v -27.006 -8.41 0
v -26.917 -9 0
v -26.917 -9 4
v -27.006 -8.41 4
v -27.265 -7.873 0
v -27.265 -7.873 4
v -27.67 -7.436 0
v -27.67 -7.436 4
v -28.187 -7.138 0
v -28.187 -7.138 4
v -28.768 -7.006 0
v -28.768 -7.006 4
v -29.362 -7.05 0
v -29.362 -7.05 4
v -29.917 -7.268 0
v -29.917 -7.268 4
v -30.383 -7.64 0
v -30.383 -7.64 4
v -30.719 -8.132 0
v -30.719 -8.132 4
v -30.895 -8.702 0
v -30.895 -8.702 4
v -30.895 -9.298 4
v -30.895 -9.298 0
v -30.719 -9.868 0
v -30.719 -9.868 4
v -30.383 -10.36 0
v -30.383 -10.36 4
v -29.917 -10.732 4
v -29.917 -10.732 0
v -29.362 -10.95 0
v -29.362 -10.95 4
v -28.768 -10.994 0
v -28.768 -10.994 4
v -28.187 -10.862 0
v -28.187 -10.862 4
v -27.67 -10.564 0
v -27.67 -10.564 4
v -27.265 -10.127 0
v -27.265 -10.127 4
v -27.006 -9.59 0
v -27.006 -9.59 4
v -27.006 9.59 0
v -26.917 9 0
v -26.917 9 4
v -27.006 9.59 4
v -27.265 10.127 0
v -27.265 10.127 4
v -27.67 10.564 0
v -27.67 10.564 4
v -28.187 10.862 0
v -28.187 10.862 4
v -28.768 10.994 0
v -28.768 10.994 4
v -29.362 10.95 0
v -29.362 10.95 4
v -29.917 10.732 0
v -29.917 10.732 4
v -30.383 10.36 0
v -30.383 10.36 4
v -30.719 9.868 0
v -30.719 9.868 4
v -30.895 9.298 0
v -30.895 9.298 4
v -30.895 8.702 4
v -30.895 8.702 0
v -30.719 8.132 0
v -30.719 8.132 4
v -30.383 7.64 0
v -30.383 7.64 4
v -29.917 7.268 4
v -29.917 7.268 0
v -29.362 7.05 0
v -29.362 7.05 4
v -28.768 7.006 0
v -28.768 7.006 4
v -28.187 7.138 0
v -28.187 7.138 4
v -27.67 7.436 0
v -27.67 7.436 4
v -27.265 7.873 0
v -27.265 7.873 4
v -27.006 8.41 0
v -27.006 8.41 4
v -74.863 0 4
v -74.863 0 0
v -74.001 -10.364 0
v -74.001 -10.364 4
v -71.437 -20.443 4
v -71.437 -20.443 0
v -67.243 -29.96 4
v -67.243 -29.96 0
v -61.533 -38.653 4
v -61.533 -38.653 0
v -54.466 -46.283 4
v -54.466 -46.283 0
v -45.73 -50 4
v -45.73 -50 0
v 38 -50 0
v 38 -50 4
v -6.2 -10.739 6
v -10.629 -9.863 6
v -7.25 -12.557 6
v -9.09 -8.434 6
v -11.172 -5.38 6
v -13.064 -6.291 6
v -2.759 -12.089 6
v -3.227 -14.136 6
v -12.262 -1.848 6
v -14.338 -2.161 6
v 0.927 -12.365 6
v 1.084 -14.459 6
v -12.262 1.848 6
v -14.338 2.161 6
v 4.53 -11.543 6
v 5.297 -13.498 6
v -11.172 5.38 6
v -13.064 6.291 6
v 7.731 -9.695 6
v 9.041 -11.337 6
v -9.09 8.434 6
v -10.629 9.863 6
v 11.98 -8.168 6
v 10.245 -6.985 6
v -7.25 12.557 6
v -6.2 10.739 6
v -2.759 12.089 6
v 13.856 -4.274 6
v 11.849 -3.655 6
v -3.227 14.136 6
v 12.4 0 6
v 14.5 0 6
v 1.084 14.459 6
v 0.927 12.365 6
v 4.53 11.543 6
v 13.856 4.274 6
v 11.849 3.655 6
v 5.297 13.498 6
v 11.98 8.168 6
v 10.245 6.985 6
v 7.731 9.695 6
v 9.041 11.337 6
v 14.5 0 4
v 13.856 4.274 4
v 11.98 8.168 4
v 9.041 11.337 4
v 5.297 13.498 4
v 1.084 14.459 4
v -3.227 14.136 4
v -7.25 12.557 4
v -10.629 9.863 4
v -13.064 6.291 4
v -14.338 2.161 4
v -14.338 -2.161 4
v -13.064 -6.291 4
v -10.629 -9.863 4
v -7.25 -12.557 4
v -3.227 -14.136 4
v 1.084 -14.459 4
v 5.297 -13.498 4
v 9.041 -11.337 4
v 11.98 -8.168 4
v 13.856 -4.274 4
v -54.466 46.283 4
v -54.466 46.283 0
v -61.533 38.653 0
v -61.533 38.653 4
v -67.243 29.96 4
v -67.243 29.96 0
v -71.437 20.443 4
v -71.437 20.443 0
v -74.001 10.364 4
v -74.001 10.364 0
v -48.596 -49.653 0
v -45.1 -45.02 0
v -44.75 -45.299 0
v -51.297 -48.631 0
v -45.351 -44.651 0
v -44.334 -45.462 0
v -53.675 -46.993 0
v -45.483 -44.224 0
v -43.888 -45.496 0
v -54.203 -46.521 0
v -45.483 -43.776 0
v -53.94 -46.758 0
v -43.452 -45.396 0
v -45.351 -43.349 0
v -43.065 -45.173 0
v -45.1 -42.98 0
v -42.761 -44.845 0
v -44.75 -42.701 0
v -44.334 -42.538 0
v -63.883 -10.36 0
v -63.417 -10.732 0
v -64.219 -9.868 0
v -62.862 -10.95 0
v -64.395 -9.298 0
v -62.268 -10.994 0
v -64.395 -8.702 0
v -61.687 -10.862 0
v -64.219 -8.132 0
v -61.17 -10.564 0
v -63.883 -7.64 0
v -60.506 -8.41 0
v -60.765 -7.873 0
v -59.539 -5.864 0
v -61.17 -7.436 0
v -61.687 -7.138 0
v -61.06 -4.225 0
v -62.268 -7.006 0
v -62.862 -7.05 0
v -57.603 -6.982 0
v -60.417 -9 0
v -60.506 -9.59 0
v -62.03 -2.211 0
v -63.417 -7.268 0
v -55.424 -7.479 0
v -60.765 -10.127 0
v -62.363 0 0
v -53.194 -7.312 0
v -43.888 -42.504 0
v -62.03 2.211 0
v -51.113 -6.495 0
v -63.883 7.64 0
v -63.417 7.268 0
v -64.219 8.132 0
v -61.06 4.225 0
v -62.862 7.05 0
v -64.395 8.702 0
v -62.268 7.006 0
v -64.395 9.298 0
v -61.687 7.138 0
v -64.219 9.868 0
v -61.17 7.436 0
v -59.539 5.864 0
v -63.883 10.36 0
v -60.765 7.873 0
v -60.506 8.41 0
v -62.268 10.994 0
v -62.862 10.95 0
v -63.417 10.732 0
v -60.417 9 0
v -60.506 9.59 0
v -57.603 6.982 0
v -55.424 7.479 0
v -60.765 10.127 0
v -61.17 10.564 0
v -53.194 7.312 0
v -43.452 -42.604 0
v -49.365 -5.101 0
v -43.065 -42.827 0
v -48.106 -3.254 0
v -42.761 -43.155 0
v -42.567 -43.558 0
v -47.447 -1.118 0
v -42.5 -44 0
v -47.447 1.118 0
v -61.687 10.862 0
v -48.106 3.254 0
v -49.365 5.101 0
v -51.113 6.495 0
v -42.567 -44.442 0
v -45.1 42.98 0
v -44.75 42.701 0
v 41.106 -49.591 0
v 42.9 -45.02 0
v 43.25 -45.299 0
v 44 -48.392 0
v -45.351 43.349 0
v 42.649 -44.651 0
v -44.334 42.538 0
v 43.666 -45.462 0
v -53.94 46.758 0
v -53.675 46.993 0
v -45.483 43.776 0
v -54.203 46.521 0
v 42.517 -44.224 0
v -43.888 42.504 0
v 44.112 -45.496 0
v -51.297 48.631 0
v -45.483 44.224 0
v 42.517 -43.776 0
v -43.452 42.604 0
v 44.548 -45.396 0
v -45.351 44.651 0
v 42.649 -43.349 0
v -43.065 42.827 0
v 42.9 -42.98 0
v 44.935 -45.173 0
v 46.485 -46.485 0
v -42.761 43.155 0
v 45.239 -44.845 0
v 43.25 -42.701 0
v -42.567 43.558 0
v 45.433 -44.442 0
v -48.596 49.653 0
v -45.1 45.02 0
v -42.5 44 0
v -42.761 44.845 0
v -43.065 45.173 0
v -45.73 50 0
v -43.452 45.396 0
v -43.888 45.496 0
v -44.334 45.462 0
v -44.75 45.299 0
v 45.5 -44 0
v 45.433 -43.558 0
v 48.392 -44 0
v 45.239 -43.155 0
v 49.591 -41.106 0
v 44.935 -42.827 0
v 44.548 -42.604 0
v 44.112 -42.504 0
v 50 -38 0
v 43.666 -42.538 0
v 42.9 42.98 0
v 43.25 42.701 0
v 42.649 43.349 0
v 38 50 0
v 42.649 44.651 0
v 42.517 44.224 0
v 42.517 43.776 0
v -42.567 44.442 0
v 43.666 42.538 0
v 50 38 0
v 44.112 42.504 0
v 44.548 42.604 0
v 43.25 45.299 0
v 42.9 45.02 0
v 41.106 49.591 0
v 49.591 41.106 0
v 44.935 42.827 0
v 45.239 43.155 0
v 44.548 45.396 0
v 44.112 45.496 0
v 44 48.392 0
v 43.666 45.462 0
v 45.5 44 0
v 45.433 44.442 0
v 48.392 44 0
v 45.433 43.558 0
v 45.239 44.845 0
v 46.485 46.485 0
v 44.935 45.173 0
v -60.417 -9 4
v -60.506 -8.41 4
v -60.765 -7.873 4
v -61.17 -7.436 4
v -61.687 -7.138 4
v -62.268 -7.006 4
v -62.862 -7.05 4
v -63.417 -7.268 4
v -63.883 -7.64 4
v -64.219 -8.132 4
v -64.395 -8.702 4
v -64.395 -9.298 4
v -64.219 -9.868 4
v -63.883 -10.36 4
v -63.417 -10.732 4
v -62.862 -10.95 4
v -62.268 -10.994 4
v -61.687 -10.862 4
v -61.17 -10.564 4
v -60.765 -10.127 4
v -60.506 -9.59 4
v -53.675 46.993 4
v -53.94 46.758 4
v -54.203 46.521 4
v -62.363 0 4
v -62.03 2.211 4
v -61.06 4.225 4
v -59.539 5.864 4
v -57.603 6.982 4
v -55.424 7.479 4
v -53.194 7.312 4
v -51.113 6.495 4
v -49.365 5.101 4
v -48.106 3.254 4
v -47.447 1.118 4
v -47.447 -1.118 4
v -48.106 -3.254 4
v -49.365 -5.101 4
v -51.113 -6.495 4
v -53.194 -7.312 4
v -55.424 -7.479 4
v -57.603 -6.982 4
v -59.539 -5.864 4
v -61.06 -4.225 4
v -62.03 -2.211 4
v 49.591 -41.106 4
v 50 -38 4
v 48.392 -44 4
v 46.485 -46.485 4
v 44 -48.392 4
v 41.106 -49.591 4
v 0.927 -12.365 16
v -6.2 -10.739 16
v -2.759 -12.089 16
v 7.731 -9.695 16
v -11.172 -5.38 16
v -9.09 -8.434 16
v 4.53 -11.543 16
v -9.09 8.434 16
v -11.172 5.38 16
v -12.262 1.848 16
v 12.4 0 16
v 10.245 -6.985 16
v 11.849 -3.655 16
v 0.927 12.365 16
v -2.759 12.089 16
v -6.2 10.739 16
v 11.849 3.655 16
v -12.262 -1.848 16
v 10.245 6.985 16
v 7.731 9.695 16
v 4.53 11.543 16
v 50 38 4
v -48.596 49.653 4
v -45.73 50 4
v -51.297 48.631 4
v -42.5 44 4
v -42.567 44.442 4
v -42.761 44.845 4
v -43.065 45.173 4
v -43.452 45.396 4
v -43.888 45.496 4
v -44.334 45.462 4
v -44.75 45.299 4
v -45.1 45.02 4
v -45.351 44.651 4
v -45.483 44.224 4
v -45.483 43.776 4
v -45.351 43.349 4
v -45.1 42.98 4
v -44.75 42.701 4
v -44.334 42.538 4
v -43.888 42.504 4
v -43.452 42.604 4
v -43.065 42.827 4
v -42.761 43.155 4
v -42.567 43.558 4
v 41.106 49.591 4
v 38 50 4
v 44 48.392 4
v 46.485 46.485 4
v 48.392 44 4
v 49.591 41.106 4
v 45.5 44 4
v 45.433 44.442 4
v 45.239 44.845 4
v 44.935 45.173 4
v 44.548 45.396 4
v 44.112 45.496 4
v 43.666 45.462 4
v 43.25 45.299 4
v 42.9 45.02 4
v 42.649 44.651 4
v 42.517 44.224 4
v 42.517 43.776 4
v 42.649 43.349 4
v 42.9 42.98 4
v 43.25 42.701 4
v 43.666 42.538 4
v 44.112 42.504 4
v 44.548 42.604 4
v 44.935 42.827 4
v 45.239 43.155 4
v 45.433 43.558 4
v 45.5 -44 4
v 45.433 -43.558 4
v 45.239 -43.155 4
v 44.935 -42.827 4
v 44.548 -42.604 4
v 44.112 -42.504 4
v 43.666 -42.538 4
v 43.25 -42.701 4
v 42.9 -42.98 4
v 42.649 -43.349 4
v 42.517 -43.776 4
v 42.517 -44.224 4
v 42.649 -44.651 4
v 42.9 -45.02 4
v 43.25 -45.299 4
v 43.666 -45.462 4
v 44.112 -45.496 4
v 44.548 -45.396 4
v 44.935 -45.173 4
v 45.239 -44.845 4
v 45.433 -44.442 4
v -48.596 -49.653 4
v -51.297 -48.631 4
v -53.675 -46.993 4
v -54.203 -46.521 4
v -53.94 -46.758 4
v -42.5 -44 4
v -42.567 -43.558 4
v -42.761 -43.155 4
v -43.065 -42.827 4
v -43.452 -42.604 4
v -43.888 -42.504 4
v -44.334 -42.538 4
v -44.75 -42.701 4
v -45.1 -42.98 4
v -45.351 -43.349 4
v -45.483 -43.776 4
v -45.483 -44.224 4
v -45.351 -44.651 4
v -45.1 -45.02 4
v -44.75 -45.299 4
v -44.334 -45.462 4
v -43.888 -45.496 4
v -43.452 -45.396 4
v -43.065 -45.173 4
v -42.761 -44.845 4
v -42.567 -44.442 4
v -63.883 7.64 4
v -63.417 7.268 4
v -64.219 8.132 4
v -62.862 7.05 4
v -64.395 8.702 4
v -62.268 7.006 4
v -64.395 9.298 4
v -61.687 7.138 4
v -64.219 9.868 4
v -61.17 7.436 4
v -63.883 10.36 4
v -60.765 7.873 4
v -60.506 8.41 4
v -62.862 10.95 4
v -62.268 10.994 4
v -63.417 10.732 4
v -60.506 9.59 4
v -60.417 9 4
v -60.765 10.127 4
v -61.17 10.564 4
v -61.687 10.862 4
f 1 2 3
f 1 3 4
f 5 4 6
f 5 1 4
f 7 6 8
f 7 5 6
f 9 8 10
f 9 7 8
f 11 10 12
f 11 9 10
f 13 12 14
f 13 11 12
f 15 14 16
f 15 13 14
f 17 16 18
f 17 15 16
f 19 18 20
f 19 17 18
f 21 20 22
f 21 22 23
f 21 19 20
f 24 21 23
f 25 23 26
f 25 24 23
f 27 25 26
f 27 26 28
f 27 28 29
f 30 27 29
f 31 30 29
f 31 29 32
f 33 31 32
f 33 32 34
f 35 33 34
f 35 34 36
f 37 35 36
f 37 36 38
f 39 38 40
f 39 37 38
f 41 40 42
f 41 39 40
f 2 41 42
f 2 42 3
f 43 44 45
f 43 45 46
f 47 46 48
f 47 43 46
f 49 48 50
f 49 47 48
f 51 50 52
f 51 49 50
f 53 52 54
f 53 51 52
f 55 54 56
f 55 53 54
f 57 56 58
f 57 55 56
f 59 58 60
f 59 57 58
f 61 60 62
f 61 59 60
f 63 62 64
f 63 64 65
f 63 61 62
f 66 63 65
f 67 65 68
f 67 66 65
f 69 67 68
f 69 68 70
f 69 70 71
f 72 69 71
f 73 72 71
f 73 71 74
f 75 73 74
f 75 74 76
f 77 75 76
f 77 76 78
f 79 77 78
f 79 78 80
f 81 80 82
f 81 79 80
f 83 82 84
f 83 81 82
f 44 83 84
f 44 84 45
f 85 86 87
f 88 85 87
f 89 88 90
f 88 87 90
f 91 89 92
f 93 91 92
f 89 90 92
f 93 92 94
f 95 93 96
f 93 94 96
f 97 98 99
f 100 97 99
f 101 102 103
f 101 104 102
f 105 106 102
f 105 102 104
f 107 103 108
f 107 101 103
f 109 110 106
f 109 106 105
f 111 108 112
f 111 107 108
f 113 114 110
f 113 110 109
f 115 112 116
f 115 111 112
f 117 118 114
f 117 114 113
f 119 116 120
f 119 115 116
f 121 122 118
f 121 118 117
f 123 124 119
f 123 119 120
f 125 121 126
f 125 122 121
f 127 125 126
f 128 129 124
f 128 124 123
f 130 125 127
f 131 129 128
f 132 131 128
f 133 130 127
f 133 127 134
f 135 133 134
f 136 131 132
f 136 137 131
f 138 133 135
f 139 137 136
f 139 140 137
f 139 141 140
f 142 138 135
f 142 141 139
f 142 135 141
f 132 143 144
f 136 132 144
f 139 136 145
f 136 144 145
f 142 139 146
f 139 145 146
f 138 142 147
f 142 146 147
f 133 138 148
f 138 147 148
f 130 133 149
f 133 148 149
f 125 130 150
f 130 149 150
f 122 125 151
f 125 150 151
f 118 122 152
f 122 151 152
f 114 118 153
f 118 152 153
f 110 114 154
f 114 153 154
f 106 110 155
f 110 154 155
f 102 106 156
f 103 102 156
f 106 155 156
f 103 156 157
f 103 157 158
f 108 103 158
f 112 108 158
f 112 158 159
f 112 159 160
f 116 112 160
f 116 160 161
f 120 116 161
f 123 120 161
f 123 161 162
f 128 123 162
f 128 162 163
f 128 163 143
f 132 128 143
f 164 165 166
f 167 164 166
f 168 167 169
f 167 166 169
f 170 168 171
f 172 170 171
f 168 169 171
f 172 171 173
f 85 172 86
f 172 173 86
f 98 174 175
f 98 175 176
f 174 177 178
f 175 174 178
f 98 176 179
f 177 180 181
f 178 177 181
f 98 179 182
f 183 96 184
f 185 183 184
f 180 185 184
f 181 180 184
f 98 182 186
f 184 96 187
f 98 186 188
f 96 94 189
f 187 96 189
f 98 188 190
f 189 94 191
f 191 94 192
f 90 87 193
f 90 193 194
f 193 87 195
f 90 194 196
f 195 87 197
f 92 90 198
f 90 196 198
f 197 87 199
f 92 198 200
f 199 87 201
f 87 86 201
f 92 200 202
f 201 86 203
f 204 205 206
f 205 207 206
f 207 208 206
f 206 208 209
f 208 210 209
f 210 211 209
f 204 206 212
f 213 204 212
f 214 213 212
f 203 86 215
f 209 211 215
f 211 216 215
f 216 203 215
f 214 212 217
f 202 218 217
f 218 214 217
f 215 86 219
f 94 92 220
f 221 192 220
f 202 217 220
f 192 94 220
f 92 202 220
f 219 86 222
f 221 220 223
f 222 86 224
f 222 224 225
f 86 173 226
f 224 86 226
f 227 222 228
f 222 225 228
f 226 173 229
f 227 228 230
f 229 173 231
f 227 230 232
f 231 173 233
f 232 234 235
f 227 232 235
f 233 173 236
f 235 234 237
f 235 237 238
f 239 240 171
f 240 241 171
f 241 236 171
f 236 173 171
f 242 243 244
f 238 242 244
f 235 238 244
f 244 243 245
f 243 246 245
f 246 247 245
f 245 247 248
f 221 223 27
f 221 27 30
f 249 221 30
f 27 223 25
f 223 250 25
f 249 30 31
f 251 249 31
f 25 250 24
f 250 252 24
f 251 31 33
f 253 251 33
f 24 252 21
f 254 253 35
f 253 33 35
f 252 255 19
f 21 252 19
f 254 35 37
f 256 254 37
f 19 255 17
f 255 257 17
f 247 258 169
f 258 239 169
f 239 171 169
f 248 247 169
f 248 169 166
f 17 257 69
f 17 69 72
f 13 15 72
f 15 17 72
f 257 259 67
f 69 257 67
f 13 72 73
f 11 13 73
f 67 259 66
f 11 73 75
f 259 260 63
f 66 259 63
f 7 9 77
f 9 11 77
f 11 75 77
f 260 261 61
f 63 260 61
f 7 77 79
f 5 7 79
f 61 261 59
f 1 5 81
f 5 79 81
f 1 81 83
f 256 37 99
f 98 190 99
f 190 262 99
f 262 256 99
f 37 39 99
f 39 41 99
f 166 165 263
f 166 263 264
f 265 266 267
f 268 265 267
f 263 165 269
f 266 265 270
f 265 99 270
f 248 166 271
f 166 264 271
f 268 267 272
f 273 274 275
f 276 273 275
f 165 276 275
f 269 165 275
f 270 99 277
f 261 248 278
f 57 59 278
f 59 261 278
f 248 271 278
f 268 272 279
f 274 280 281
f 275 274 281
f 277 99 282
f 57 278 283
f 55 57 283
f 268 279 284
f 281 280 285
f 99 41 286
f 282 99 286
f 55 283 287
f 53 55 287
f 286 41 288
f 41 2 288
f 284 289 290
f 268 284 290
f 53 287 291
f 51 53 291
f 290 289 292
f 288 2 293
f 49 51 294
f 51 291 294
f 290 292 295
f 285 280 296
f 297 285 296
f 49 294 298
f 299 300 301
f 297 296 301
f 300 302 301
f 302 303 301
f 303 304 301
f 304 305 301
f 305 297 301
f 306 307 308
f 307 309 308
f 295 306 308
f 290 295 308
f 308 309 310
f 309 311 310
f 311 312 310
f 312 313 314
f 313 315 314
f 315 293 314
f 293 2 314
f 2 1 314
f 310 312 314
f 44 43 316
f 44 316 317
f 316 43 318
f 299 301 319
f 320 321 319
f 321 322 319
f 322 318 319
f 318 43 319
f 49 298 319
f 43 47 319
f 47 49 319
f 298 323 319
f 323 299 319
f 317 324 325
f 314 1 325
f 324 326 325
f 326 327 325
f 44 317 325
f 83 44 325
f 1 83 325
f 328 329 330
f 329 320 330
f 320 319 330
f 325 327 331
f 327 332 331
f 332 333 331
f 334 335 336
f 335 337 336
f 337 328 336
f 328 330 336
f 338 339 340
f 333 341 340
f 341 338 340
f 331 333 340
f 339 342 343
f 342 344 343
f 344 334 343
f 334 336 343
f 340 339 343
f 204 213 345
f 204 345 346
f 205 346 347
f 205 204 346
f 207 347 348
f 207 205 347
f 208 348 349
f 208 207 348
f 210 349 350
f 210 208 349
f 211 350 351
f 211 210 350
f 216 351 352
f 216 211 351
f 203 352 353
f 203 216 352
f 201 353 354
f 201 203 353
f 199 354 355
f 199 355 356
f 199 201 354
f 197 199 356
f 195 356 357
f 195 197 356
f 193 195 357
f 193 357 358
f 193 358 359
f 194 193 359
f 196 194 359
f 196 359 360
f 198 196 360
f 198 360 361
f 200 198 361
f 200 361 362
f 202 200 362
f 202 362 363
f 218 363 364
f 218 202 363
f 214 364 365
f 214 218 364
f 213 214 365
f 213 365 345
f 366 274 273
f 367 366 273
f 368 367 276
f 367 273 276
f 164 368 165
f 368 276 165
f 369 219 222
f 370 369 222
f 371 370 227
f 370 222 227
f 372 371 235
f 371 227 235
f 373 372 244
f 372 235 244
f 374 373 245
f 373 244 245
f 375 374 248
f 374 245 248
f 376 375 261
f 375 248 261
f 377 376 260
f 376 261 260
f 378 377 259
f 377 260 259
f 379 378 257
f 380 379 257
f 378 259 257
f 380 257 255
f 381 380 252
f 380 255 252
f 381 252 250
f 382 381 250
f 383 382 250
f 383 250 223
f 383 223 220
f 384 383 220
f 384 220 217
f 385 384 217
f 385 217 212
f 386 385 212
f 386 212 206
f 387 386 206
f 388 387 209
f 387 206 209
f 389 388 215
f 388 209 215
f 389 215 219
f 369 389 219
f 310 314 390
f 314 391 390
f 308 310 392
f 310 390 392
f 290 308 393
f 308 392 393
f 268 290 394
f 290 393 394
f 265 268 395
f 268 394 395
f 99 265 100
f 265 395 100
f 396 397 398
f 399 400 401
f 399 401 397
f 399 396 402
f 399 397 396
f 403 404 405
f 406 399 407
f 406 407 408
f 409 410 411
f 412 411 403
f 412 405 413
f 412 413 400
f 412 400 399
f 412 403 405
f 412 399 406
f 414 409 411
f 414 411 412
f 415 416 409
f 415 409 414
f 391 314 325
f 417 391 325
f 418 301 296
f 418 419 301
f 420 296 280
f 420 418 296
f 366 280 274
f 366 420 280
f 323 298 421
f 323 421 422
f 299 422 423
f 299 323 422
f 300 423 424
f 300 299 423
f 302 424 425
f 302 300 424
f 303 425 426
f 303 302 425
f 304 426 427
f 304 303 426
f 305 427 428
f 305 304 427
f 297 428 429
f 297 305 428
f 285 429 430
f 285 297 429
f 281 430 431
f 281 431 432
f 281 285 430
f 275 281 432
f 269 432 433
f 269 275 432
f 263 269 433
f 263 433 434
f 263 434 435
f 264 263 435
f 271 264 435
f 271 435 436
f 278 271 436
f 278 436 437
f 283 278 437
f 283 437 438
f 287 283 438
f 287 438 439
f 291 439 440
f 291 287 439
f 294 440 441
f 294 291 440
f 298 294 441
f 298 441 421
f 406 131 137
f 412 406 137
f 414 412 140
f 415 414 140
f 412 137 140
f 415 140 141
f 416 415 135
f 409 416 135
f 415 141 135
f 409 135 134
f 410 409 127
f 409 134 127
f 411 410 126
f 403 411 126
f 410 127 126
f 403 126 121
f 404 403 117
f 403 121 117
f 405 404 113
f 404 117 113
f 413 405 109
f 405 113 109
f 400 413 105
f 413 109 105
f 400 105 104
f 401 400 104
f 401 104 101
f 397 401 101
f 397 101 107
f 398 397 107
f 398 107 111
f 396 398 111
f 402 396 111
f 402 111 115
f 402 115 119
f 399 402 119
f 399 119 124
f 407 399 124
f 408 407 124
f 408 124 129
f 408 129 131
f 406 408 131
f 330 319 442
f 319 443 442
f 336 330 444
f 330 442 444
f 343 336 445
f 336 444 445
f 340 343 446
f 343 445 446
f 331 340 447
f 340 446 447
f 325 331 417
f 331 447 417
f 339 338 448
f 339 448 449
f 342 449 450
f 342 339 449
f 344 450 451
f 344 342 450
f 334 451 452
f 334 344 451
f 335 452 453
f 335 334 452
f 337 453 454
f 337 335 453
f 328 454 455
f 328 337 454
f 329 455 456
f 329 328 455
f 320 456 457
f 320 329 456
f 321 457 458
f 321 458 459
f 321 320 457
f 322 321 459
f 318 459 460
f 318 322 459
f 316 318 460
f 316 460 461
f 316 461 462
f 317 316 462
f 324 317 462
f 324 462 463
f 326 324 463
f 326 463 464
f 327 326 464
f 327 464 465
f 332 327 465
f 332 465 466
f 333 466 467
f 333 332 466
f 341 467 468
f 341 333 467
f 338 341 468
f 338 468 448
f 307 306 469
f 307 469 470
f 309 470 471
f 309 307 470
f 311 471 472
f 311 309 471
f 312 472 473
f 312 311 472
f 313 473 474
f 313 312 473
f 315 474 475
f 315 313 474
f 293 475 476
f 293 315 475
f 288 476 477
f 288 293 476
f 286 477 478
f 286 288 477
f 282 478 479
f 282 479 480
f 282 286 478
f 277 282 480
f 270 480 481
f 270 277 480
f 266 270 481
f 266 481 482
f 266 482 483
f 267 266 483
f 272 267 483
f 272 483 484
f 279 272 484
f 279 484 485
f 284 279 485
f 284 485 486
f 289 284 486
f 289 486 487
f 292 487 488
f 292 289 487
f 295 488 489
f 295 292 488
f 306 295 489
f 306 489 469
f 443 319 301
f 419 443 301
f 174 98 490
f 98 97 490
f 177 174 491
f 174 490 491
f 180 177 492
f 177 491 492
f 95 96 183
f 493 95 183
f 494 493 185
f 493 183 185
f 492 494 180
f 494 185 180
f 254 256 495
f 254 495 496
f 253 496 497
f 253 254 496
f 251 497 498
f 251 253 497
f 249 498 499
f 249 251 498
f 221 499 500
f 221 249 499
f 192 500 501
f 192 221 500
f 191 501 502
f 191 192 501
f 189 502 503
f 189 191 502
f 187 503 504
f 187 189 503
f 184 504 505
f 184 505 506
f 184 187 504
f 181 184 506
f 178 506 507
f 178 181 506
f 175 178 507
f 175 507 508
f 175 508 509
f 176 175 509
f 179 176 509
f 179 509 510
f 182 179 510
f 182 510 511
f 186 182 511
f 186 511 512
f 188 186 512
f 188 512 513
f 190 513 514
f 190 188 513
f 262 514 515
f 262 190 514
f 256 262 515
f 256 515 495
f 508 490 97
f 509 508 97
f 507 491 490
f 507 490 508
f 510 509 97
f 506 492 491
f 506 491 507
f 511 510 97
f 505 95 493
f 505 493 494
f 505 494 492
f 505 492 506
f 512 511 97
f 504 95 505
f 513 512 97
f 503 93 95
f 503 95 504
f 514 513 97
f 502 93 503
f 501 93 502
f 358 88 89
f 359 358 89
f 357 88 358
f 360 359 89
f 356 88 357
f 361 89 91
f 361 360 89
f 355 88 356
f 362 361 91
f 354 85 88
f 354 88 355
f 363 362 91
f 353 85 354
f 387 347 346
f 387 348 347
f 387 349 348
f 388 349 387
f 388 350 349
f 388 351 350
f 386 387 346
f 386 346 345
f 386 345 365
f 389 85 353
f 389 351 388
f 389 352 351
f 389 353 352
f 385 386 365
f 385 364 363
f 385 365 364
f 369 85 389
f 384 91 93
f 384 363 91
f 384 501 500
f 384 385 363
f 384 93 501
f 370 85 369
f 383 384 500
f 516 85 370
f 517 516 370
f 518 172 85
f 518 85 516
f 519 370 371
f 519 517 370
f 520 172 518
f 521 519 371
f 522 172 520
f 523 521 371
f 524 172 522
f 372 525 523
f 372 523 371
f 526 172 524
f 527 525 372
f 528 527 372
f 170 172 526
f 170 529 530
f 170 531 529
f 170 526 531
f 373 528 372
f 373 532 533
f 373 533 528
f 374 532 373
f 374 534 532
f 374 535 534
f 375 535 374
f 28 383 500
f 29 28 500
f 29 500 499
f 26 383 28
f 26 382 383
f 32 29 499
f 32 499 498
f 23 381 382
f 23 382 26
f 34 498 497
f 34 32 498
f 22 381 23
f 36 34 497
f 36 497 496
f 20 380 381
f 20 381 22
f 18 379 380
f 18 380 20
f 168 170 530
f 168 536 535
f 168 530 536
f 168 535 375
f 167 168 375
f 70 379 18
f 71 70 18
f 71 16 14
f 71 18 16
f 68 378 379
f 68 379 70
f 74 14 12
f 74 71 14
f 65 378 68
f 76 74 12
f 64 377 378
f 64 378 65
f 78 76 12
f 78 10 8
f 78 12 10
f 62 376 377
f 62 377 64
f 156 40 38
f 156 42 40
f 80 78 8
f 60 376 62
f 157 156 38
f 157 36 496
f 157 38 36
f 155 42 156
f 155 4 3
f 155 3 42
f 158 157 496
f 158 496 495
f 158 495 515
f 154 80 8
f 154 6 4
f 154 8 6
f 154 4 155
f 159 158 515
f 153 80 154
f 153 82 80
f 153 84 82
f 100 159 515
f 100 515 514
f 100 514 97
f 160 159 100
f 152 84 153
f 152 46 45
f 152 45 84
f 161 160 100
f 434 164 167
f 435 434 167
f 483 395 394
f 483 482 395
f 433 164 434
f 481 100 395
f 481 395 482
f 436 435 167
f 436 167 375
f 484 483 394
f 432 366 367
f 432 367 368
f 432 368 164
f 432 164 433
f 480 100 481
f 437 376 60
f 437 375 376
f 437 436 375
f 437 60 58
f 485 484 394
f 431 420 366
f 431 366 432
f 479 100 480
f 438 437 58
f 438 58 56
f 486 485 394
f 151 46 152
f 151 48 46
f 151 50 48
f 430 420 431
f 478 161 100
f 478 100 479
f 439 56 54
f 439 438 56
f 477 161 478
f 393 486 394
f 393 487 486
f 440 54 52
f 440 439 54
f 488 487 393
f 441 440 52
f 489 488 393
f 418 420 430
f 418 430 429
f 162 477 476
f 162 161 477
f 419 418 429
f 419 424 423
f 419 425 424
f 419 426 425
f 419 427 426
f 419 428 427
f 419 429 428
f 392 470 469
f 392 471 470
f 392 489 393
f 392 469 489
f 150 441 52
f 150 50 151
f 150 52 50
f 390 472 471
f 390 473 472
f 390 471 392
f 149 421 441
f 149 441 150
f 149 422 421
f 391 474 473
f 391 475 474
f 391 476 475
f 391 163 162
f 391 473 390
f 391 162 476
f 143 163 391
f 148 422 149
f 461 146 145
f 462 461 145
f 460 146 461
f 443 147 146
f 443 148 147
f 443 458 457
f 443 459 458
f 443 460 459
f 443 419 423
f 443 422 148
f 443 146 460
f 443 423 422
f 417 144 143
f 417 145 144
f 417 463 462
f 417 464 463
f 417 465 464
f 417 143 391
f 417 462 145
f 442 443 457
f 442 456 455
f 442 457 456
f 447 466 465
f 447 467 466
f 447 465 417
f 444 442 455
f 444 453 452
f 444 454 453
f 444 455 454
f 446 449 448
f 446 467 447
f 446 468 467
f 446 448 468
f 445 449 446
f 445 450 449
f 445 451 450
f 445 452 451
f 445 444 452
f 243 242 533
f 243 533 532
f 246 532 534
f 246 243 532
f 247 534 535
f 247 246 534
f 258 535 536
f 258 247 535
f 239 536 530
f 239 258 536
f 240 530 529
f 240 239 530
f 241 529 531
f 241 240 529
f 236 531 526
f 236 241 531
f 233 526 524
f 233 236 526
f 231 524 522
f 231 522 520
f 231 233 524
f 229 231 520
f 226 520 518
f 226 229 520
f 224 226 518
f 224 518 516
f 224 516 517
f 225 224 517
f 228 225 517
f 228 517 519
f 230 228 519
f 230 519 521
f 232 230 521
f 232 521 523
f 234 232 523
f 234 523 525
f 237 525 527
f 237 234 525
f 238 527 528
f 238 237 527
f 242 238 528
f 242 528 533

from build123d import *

# Parameters (mm, degrees)
F0_R     = 1.5
F0_R_2   = 2
F0_R_3   = 14.5
F1_DEPTH = 4
F2_R     = 12
F0_R_4   = 12.4
F3_DEPTH = 6
F4_DEPTH = 16


with BuildPart() as f1:
    # F0 (on Top) → F1 (new body)
    with BuildSketch(Plane.XY):
        with BuildLine():
            Line((40.1261364576, -50), (50, -50))
            Line((50, -50), (50, -40.1261364576))
            ThreePointArc((50, -40.1261364576), (48.5323223277, -39.658202653), (47, -39.5))
            Line((47, -39.5), (47, -47))
            Line((47, -47), (39.5, -47))
            ThreePointArc((39.5, -47), (39.658202653, -48.5323223277), (40.1261364576, -50))
        make_face()
        with BuildLine():
            Line((-40.1261364576, -50), (40.1261364576, -50))
            ThreePointArc((40.1261364576, -50), (39.658202653, -48.5323223277), (39.5, -47))
            Line((39.5, -47), (-39.5, -47))
            ThreePointArc((-39.5, -47), (-39.658202653, -48.5323223277), (-40.1261364576, -50))
        make_face()
        with BuildLine():
            ThreePointArc((47, -39.5), (48.5323223277, -39.658202653), (50, -40.1261364576))
            Line((50, -40.1261364576), (50, 40.1261364576))
            ThreePointArc((50, 40.1261364576), (48.5323223277, 39.658202653), (47, 39.5))
            Line((47, 39.5), (47, -39.5))
        make_face()
        with BuildLine():
            Line((-50, -50), (-40.1261364576, -50))
            ThreePointArc((-40.1261364576, -50), (-39.658202653, -48.5323223277), (-39.5, -47))
            Line((-39.5, -47), (-47, -47))
            Line((-47, -47), (-47, -39.5))
            ThreePointArc((-47, -39.5), (-52.0432569895, -41.4488236438), (-54.4656023889, -46.2825176166))
            ThreePointArc((-54.4656023889, -46.2825176166), (-52.2758824324, -48.1930098751), (-50, -50))
        make_face()
        with BuildLine():
            ThreePointArc((47, -39.5), (41.6966991411, -41.6966991411), (39.5, -47))
            Line((39.5, -47), (47, -47))
            Line((47, -47), (47, -39.5))
        make_face()
        with Locations((44, -44)):
            Circle(F0_R, mode=Mode.SUBTRACT)
        with BuildLine():
            Line((-39.5, -47), (39.5, -47))
            ThreePointArc((39.5, -47), (41.6966991411, -41.6966991411), (47, -39.5))
            Line((47, -39.5), (47, 39.5))
            ThreePointArc((47, 39.5), (41.6966991411, 41.6966991411), (39.5, 47))
            Line((39.5, 47), (-39.5, 47))
            ThreePointArc((-39.5, 47), (-41.6966991411, 41.6966991411), (-47, 39.5))
            Line((-47, 39.5), (-47, -39.5))
            ThreePointArc((-47, -39.5), (-41.6966991411, -41.6966991411), (-39.5, -47))
        make_face()
        with Locations((-28.9172229711, -9)):
            Circle(F0_R_2, mode=Mode.SUBTRACT)
        with Locations((-28.9172229711, 9)):
            Circle(F0_R_2, mode=Mode.SUBTRACT)
        Circle(F0_R_3, mode=Mode.SUBTRACT)
        with BuildLine():
            ThreePointArc((47, 39.5), (48.5323223277, 39.658202653), (50, 40.1261364576))
            Line((50, 40.1261364576), (50, 50))
            Line((50, 50), (40.1261364576, 50))
            ThreePointArc((40.1261364576, 50), (39.658202653, 48.5323223277), (39.5, 47))
            Line((39.5, 47), (47, 47))
            Line((47, 47), (47, 39.5))
        make_face()
        with BuildLine():
            ThreePointArc((-74.8632505062, 0), (-69.5376936802, -25.2890069281), (-54.4656023889, -46.2825176166))
            ThreePointArc((-54.4656023889, -46.2825176166), (-52.0432569895, -41.4488236438), (-47, -39.5))
            Line((-47, -39.5), (-47, 39.5))
            ThreePointArc((-47, 39.5), (-52.0432569895, 41.4488236438), (-54.4656023889, 46.2825176166))
            ThreePointArc((-54.4656023889, 46.2825176166), (-69.5376936802, 25.2890069281), (-74.8632505062, 0))
        make_face()
        with Locations((-62.4172229711, -9)):
            Circle(F0_R_2, mode=Mode.SUBTRACT)
        with Locations((-62.4172229711, 9)):
            Circle(F0_R_2, mode=Mode.SUBTRACT)
        with BuildLine():
            ThreePointArc((-47.3632505062, 0), (-54.8632505062, -7.5), (-62.3632505062, 0))
            ThreePointArc((-62.3632505062, 0), (-54.8632505062, 7.5), (-47.3632505062, 0))
        make_face(mode=Mode.SUBTRACT)
        with BuildLine():
            Line((-47, -47), (-39.5, -47))
            ThreePointArc((-39.5, -47), (-41.6966991411, -41.6966991411), (-47, -39.5))
            Line((-47, -39.5), (-47, -47))
        make_face()
        with Locations((-44, -44)):
            Circle(F0_R, mode=Mode.SUBTRACT)
        with BuildLine():
            ThreePointArc((39.5, 47), (41.6966991411, 41.6966991411), (47, 39.5))
            Line((47, 39.5), (47, 47))
            Line((47, 47), (39.5, 47))
        make_face()
        with Locations((44, 44)):
            Circle(F0_R, mode=Mode.SUBTRACT)
        with BuildLine():
            ThreePointArc((39.5, 47), (39.658202653, 48.5323223277), (40.1261364576, 50))
            Line((40.1261364576, 50), (-40.1261364576, 50))
            ThreePointArc((-40.1261364576, 50), (-39.658202653, 48.5323223277), (-39.5, 47))
            Line((-39.5, 47), (39.5, 47))
        make_face()
        with BuildLine():
            ThreePointArc((-54.4656023889, 46.2825176166), (-52.0432569895, 41.4488236438), (-47, 39.5))
            Line((-47, 39.5), (-47, 47))
            Line((-47, 47), (-39.5, 47))
            ThreePointArc((-39.5, 47), (-39.658202653, 48.5323223277), (-40.1261364576, 50))
            Line((-40.1261364576, 50), (-50, 50))
            ThreePointArc((-50, 50), (-52.2758824324, 48.1930098751), (-54.4656023889, 46.2825176166))
        make_face()
        with BuildLine():
            Line((-47, 47), (-47, 39.5))
            ThreePointArc((-47, 39.5), (-41.6966991411, 41.6966991411), (-39.5, 47))
            Line((-39.5, 47), (-47, 47))
        make_face()
        with Locations((-44, 44)):
            Circle(F0_R, mode=Mode.SUBTRACT)
    extrude(amount=F1_DEPTH)

    # F2
    f2_edges = [f1.edges().sort_by_distance(p)[0] for p in [
        (-50, 50, 2),
        (50, 50, 2),
        (50, -50, 2),
        (-50, -50, 2),
    ]]
    fillet(f2_edges, radius=F2_R)

    # F0 (on Top) → F3 (join)
    with BuildSketch(Plane.XY):
        Circle(F0_R_3)
        Circle(F0_R_4, mode=Mode.SUBTRACT)
    extrude(amount=F3_DEPTH)

    # F0 (on Top) → F4 (join)
    with BuildSketch(Plane.XY):
        Circle(F0_R_4)
    extrude(amount=F4_DEPTH)


solid = f1.part
